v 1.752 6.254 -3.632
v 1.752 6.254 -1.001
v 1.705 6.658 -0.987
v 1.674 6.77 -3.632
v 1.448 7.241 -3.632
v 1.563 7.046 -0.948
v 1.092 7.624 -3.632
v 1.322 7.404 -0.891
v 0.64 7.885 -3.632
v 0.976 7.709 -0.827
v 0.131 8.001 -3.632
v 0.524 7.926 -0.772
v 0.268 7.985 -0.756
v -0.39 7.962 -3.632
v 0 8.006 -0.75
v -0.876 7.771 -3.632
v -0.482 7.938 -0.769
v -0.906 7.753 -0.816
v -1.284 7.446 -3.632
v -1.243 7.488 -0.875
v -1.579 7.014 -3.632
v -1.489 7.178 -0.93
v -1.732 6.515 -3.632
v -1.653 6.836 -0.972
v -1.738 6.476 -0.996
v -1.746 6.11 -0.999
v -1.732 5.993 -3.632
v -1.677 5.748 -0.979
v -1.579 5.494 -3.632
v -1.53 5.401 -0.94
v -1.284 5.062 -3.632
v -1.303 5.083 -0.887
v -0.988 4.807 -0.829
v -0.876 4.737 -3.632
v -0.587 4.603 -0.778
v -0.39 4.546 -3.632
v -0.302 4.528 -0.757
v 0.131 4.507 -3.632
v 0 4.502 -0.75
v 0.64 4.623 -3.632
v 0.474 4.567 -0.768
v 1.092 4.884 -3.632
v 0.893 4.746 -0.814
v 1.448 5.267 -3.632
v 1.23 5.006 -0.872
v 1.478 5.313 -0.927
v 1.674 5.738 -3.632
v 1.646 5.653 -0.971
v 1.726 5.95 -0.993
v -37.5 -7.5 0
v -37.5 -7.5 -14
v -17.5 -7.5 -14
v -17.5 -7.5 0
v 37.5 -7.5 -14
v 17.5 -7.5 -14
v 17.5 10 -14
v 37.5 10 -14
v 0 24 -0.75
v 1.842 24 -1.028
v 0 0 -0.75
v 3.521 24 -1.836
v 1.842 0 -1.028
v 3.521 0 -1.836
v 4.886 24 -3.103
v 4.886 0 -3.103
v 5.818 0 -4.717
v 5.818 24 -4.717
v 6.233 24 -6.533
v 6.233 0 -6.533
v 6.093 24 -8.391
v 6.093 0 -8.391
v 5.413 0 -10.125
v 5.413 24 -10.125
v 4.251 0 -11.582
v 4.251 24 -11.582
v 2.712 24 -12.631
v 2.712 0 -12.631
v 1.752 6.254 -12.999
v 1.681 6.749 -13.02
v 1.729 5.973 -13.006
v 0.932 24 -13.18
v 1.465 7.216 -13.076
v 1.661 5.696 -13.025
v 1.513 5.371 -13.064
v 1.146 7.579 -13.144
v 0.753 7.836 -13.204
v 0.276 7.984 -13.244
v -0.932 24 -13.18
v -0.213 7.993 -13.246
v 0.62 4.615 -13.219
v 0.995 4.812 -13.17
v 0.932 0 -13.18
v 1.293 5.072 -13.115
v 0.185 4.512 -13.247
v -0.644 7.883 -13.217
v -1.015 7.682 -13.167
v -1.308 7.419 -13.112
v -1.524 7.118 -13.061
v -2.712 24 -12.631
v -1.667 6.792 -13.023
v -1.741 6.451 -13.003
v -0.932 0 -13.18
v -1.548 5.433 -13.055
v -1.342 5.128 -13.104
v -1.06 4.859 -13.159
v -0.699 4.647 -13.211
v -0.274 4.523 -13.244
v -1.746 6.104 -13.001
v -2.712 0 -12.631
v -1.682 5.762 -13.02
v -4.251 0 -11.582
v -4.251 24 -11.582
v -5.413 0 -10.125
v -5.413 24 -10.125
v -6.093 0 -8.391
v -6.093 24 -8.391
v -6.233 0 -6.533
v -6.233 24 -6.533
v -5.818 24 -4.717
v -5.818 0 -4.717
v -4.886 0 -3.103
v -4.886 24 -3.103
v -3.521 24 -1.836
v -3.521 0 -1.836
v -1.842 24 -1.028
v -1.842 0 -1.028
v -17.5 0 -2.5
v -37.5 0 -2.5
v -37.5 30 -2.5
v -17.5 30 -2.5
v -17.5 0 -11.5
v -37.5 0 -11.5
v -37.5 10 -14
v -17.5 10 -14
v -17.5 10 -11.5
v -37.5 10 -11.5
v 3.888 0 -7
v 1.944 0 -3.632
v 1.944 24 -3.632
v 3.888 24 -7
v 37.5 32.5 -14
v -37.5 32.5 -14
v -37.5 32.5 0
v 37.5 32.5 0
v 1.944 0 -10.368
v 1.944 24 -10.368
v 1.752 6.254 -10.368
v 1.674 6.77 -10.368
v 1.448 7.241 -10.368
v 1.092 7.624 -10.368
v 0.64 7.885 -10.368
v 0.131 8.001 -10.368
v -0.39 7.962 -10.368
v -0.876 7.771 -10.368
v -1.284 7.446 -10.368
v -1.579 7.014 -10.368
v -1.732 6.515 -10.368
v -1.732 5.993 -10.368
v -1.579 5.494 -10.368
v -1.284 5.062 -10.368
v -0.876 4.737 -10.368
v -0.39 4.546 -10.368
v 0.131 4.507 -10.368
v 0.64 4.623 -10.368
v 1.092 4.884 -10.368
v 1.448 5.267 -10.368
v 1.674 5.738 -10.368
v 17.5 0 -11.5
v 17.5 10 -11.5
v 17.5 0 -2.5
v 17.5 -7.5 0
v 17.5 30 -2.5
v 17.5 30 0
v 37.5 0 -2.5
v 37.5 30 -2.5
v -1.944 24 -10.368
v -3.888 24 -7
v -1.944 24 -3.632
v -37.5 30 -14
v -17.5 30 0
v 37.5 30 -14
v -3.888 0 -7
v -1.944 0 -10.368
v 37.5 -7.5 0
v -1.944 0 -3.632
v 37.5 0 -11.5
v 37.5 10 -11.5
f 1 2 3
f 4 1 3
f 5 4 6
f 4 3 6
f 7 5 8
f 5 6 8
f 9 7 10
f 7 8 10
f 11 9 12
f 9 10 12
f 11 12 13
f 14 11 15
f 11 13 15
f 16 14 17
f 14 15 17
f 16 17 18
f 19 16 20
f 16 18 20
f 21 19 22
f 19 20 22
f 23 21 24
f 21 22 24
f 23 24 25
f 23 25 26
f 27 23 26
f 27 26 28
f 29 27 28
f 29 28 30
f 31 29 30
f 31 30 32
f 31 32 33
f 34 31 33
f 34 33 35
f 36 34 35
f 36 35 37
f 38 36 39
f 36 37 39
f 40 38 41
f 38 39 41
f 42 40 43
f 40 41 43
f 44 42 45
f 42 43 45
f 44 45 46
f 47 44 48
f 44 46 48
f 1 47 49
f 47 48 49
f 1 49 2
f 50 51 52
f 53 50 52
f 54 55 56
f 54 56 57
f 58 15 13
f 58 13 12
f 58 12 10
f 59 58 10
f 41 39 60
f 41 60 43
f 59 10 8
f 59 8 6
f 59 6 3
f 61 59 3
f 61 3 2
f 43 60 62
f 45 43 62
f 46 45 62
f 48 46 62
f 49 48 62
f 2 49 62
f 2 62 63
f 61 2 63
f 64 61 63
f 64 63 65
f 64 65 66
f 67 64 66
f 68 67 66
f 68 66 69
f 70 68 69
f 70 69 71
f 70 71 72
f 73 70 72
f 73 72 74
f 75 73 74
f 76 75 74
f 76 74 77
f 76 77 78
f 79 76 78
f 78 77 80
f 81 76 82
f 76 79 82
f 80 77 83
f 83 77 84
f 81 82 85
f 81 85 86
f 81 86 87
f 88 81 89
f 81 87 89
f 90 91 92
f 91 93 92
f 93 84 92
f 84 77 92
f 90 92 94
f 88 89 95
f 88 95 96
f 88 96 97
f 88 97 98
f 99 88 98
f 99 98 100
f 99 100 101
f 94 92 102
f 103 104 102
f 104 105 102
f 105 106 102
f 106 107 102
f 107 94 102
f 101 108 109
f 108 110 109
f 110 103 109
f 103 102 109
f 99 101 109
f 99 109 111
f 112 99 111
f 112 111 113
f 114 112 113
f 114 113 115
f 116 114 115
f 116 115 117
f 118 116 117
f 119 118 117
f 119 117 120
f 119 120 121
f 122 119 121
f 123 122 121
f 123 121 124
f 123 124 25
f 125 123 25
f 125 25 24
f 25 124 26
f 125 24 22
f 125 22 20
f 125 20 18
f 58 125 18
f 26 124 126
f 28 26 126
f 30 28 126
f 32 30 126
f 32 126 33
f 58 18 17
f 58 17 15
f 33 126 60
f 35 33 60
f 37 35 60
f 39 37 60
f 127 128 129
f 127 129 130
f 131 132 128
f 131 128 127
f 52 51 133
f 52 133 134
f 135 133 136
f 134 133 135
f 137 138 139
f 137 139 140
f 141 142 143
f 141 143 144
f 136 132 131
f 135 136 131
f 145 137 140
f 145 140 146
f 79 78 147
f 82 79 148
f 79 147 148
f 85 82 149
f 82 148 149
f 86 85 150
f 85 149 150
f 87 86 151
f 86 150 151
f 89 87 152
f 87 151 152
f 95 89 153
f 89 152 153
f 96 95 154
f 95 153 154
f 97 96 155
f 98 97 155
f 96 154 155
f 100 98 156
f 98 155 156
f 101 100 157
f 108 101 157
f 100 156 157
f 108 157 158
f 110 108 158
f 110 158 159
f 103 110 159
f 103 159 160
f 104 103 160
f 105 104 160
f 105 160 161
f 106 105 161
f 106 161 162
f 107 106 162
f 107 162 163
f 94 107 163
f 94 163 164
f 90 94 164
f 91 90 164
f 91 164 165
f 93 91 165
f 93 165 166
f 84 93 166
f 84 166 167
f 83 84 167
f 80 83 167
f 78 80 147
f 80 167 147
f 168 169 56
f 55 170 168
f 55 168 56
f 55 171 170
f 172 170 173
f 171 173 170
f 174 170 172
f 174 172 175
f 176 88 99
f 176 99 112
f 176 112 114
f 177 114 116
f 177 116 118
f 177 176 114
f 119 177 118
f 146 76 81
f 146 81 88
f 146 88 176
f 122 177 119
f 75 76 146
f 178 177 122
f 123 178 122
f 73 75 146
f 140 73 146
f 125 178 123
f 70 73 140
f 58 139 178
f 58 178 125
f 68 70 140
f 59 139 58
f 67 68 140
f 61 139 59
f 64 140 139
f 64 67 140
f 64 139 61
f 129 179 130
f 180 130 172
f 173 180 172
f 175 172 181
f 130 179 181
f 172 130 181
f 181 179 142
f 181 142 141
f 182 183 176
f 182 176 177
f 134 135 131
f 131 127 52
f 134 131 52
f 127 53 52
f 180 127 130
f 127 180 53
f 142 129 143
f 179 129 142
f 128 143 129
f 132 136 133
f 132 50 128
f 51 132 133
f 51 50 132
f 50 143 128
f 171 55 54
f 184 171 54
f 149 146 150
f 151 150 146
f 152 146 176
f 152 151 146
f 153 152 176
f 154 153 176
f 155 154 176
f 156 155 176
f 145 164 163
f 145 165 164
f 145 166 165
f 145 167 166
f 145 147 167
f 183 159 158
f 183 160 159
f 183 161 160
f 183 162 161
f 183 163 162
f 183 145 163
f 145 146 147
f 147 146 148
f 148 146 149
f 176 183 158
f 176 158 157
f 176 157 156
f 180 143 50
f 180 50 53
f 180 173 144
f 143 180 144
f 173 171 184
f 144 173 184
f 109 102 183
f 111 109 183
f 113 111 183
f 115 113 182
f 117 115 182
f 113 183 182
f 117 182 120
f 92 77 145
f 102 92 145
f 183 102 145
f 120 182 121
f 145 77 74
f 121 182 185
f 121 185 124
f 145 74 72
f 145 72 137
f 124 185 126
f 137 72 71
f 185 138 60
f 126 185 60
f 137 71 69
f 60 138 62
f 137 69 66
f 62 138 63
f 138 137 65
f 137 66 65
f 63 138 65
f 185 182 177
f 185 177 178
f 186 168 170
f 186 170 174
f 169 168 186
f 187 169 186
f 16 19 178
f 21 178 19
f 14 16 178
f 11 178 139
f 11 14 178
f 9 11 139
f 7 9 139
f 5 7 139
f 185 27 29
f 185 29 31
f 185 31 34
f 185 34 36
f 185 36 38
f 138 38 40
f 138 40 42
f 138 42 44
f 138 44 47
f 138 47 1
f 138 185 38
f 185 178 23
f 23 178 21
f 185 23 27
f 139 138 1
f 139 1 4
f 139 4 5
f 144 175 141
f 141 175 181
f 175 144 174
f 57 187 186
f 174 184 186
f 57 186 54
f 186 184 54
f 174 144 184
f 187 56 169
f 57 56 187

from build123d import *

# Parameters (mm, degrees)
SKETCH2_W           = 20
SKETCH2_H           = 14
BOSS_EXTRUDE1_DEPTH = 7.5
SKETCH4_W           = 20
SKETCH4_H           = 2.5
BOSS_EXTRUDE2_DEPTH = 10
SKETCH6_W           = 20
SKETCH6_H           = 2.5
BOSS_EXTRUDE3_DEPTH = 30
SKETCH8_W           = 20
SKETCH8_H           = 14
BOSS_EXTRUDE4_DEPTH = 7.5
SKETCH9_W           = 20
SKETCH9_H           = 2.5
BOSS_EXTRUDE5_DEPTH = 10
SKETCH10_W          = 20
SKETCH10_H          = 2.5
BOSS_EXTRUDE6_DEPTH = 30
SKETCH11_W          = 75
SKETCH11_H          = 14
BOSS_EXTRUDE7_DEPTH = 2.5
BOSS_EXTRUDE8_START = -32.5
SKETCH12_R          = 6.25
BOSS_EXTRUDE8_DEPTH = 24
SKETCH13_R          = 1.752036184
CUT_EXTRUDE1_DEPTH  = 52.560643906


with BuildPart() as part:
    # Sketch2 → Boss-Extrude1 (new body)
    with BuildSketch(Plane(origin=(0, 0, 0), x_dir=(1, 0, 0), z_dir=(0, 1, 0))):
        with Locations((-27.5, 7)):
            Rectangle(SKETCH2_W, SKETCH2_H)
    extrude(amount=-BOSS_EXTRUDE1_DEPTH)

    # Sketch4 → Boss-Extrude2 (add)
    with BuildSketch(Plane(origin=(0, 0, 0), x_dir=(1, 0, 0), z_dir=(0, 1, 0))):
        with Locations((-27.5, 12.75)):
            Rectangle(SKETCH4_W, SKETCH4_H)
    extrude(amount=BOSS_EXTRUDE2_DEPTH)

    # Sketch6 → Boss-Extrude3 (add)
    with BuildSketch(Plane(origin=(0, 0, 0), x_dir=(1, 0, 0), z_dir=(0, 1, 0))):
        with Locations((-27.5, 1.25)):
            Rectangle(SKETCH6_W, SKETCH6_H)
    extrude(amount=BOSS_EXTRUDE3_DEPTH)



with BuildPart() as body_2:
    # Sketch8 → Boss-Extrude4 (new body)
    with BuildSketch(Plane(origin=(0, 0, 0), x_dir=(1, 0, 0), z_dir=(0, 1, 0))):
        with Locations((27.5, 7)):
            Rectangle(SKETCH8_W, SKETCH8_H)
    extrude(amount=-BOSS_EXTRUDE4_DEPTH)

    # Sketch9 → Boss-Extrude5 (add)
    with BuildSketch(Plane(origin=(0, 0, 0), x_dir=(1, 0, 0), z_dir=(0, 1, 0))):
        with Locations((27.5, 12.75)):
            Rectangle(SKETCH9_W, SKETCH9_H)
    extrude(amount=BOSS_EXTRUDE5_DEPTH)

    # Sketch10 → Boss-Extrude6 (add)
    with BuildSketch(Plane(origin=(0, 0, 0), x_dir=(1, 0, 0), z_dir=(0, 1, 0))):
        with Locations((27.5, 1.25)):
            Rectangle(SKETCH10_W, SKETCH10_H)
    extrude(amount=BOSS_EXTRUDE6_DEPTH)


with BuildPart() as part_1:
    add(part.part)

    add(body_2.part)  # Boss-Extrude7 merges body 2
    # Sketch11 → Boss-Extrude7 (add)
    with BuildSketch(Plane(origin=(0, 30, 0), x_dir=(1, 0, 0), z_dir=(0, 1, 0))):
        with Locations((0, 7)):
            Rectangle(SKETCH11_W, SKETCH11_H)
    extrude(amount=BOSS_EXTRUDE7_DEPTH)


with BuildPart() as body_2_2:
    # Sketch12 → Boss-Extrude8 (new body)
    with BuildSketch(Plane(origin=(0, 32.5, 0), x_dir=(1, 0, 0), z_dir=(0, 1, 0)).offset(BOSS_EXTRUDE8_START)):
        with Locations(Location((0, 7, 0), (0, 0, 270))):
            Circle(SKETCH12_R)
        Polygon((-1.944227031, 10.3675), (-3.888454063, 7), (-1.944227031, 3.6325), (1.944227031, 3.6325), (3.888454063, 7), (1.944227031, 10.3675), align=None, mode=Mode.SUBTRACT)
    extrude(amount=BOSS_EXTRUDE8_DEPTH)

    # Sketch13 → Cut-Extrude1 (cut, through all)
    with BuildSketch(Plane.XY):
        with Locations((0, 6.254)):
            Circle(SKETCH13_R)
    extrude(amount=-CUT_EXTRUDE1_DEPTH, mode=Mode.SUBTRACT)


solid = Compound([part_1.part, body_2_2.part])
